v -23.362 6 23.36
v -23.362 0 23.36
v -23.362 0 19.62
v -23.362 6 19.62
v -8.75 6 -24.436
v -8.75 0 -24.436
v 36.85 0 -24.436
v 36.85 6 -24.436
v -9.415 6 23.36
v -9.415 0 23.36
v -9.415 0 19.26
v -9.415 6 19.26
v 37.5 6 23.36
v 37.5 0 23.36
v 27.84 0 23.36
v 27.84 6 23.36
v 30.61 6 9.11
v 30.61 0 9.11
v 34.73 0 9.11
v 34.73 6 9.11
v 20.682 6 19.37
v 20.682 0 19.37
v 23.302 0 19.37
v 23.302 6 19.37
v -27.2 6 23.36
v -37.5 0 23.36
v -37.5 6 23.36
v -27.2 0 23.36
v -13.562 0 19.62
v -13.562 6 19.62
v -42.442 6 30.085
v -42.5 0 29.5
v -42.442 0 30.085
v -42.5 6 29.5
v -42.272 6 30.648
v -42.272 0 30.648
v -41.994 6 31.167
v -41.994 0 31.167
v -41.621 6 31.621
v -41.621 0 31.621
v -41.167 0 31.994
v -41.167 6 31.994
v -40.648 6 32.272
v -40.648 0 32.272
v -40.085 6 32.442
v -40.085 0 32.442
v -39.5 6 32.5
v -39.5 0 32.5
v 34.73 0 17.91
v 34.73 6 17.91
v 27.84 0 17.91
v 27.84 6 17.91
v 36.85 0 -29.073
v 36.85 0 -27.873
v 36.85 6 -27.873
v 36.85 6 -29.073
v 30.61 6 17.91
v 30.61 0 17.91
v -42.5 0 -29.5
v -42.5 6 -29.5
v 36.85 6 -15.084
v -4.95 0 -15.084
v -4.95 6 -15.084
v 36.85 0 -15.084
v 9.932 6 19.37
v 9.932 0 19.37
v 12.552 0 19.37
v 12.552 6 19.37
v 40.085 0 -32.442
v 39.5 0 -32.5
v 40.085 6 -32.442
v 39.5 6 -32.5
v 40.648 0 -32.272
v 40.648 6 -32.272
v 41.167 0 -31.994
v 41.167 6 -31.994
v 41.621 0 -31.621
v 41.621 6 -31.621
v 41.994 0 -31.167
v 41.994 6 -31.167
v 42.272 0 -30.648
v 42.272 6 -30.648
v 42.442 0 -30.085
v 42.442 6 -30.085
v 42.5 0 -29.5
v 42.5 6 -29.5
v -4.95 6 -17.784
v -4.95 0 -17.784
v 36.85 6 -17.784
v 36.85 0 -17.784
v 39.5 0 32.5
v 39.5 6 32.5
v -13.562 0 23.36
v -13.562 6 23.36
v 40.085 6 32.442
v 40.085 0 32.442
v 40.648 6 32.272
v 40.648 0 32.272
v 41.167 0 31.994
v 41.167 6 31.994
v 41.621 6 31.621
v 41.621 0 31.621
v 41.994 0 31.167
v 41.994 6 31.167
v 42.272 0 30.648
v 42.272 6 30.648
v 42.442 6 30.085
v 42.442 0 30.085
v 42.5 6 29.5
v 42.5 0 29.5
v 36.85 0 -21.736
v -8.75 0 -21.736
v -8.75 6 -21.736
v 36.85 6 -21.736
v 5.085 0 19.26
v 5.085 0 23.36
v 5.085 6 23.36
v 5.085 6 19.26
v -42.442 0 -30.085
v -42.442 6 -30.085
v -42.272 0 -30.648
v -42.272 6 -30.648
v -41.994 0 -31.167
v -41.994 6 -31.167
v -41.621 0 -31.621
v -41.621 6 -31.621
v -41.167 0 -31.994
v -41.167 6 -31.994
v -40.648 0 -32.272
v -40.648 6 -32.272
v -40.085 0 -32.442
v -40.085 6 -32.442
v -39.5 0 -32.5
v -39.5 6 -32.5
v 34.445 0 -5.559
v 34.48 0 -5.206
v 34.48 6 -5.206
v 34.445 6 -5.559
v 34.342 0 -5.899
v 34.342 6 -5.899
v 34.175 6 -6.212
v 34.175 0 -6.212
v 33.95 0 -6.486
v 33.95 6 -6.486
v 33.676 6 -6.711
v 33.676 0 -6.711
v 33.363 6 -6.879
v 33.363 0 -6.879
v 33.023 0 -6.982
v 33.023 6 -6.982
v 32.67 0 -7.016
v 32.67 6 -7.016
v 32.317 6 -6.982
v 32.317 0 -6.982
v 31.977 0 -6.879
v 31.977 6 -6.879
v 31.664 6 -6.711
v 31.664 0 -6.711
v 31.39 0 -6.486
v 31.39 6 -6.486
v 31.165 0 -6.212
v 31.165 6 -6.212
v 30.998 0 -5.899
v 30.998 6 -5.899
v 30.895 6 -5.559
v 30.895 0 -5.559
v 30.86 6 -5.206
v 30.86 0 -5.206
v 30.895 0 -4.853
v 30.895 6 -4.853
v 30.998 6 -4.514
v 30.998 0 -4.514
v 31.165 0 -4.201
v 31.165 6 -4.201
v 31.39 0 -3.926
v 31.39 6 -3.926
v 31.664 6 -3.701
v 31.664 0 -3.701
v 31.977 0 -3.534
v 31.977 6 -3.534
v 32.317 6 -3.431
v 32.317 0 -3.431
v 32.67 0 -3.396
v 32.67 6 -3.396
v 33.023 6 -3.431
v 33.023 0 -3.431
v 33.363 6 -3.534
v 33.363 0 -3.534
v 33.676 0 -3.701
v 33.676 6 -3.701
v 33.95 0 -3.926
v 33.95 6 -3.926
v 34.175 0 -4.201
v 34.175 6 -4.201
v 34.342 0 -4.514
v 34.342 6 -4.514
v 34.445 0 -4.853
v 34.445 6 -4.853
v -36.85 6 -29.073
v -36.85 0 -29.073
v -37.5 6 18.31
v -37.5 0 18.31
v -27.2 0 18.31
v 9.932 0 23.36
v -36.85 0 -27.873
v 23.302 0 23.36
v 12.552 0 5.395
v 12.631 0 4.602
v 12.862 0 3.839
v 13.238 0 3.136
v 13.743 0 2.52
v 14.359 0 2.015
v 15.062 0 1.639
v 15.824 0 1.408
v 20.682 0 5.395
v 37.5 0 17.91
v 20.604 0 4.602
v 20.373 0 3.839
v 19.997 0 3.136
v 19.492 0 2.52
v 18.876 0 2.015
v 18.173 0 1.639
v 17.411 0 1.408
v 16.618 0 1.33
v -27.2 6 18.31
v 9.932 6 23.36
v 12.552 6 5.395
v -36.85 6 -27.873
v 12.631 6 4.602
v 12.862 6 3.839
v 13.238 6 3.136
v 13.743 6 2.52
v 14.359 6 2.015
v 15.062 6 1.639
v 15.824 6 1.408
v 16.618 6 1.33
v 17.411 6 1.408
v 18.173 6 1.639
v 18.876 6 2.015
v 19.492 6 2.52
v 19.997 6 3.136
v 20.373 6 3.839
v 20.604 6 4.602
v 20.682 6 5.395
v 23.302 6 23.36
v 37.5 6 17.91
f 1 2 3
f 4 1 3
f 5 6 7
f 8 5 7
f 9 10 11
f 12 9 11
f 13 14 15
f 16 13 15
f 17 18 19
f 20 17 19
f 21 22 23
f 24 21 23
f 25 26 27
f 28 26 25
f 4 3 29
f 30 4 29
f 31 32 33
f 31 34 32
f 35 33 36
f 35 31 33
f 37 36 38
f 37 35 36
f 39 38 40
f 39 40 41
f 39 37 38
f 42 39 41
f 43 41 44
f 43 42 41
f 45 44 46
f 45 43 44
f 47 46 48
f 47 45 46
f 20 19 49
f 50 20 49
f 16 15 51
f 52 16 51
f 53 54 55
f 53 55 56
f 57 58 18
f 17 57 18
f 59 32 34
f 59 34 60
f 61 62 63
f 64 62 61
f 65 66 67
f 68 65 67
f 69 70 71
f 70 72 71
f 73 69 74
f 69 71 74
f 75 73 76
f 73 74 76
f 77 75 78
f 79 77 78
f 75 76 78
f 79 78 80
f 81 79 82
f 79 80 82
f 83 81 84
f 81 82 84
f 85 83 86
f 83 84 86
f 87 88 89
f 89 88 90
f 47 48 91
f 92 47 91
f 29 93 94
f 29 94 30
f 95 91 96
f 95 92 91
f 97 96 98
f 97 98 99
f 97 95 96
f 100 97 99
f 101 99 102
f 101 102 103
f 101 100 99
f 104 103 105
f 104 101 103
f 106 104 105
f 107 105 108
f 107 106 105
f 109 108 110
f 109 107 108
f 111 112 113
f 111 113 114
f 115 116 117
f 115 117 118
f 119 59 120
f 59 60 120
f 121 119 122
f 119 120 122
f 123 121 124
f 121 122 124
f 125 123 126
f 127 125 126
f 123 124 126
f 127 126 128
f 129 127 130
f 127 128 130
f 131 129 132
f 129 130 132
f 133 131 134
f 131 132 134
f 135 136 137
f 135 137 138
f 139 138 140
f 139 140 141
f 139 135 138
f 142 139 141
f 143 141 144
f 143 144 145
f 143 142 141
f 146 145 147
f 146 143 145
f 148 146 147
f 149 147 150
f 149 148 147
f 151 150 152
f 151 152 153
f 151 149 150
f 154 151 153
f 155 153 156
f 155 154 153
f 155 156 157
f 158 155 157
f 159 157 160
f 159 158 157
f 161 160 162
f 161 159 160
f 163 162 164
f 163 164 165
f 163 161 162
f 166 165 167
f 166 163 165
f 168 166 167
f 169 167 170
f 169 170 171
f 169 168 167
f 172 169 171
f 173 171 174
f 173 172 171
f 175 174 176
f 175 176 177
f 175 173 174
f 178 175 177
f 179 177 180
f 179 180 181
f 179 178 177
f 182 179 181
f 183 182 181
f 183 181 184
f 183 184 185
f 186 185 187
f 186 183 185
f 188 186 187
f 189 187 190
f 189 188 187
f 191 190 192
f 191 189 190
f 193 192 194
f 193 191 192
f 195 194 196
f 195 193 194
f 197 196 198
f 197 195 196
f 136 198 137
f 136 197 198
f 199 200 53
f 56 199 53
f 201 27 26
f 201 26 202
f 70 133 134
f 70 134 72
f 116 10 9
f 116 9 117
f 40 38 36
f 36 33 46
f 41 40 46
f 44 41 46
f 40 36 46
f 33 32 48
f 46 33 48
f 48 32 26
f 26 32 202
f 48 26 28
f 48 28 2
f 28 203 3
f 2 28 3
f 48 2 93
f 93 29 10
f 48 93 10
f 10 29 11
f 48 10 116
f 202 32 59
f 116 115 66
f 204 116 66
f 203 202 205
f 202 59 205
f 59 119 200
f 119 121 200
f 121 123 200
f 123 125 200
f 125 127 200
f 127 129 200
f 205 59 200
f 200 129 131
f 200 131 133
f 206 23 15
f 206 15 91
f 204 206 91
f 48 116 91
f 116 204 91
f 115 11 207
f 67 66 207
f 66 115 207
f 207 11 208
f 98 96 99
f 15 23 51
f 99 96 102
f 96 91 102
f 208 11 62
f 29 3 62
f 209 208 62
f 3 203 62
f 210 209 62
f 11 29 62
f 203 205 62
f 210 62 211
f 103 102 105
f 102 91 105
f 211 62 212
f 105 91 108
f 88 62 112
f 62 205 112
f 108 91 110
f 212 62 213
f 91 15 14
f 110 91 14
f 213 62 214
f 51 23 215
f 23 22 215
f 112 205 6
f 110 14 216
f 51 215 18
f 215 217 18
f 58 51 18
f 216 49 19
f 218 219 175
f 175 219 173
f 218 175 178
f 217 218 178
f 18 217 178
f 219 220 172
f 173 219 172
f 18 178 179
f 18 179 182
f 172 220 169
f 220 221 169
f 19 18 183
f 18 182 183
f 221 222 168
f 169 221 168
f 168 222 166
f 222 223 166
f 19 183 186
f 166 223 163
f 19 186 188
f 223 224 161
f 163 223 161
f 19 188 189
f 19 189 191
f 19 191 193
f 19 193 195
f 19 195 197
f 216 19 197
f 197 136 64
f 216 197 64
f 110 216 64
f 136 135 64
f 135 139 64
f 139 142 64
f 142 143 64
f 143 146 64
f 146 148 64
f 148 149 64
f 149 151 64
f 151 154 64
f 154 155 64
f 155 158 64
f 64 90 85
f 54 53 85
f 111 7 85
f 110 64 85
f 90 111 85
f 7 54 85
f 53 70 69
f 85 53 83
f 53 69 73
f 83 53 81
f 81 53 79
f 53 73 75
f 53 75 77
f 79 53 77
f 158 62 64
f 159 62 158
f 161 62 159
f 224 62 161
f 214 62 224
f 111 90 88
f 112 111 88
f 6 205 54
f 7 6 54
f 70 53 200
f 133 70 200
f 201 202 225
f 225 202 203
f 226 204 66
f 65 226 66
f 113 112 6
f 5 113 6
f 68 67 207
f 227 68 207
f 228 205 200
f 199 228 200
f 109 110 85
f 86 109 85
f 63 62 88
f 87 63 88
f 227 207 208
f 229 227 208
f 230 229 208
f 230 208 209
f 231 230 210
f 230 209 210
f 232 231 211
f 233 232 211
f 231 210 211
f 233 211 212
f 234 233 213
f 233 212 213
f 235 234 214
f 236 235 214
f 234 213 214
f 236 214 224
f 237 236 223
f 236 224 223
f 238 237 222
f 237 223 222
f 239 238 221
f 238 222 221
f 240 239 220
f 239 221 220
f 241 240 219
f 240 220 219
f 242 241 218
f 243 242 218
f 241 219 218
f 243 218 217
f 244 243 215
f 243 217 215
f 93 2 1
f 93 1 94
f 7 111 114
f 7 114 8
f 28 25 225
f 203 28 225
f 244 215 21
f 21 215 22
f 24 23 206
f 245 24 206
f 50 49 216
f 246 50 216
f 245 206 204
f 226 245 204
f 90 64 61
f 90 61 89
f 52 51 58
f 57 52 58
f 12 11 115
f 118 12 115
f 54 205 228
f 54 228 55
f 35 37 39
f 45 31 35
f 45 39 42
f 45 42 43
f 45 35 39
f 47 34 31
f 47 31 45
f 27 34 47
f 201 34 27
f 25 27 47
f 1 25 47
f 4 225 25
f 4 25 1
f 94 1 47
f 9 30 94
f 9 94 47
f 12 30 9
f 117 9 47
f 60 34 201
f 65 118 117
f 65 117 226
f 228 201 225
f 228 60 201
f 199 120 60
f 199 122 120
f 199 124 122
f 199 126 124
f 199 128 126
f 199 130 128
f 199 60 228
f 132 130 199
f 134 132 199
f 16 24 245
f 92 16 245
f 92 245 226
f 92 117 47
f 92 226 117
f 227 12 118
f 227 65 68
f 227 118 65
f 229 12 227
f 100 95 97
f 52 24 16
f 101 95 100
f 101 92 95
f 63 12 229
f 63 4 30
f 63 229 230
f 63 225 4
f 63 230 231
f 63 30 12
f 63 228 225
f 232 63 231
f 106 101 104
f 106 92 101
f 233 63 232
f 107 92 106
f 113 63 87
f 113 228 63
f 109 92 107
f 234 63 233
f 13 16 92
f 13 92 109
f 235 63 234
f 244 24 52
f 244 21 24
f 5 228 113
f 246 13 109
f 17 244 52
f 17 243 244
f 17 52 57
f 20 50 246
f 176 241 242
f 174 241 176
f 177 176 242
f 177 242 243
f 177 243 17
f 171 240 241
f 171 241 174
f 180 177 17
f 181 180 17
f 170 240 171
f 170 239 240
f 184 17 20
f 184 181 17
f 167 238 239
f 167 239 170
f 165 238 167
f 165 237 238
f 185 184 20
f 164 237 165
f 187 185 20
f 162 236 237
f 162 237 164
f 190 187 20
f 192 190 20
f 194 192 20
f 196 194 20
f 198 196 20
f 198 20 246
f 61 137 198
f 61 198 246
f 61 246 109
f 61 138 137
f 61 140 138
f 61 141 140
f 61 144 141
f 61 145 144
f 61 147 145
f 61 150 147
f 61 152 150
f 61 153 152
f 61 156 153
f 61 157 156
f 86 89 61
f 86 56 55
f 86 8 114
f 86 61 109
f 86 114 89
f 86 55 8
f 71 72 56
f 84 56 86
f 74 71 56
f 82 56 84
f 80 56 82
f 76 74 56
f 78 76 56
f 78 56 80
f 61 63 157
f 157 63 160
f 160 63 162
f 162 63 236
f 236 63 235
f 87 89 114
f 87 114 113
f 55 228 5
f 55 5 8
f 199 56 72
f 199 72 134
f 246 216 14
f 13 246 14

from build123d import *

# Parameters (mm, degrees)
SKETCH1_W           = 85
SKETCH1_H           = 65
SKETCH1_R           = 1.81
SKETCH1_W_2         = 14.5
SKETCH1_H_2         = 4.1
SKETCH1_W_3         = 9.8
SKETCH1_H_3         = 3.74
SKETCH1_W_4         = 10.3
SKETCH1_H_4         = 5.05
SKETCH1_W_5         = 73.7
SKETCH1_H_5         = 1.2
SKETCH1_W_6         = 45.6
SKETCH1_H_6         = 2.7
SKETCH1_W_7         = 41.8
BOSS_EXTRUDE1_DEPTH = 6
FILLET1_R           = 3


with BuildPart() as part:
    # Sketch1 → Boss-Extrude1 (new body)
    with BuildSketch(Plane(origin=(0, 0, 0), x_dir=(1, 0, 0), z_dir=(0, 1, 0))):
        Rectangle(SKETCH1_W, SKETCH1_H)
        with Locations((32.67, 5.206342289)):
            Circle(SKETCH1_R, mode=Mode.SUBTRACT)
        Polygon((37.5, -23.359842136), (27.84, -23.359842136), (27.84, -17.909842136), (30.61, -17.909842136), (30.61, -9.109842136), (34.73, -9.109842136), (34.73, -17.909842136), (37.5, -17.909842136), align=None, mode=Mode.SUBTRACT)
        with BuildLine():
            Line((23.3025, -23.359842136), (9.9325, -23.359842136))
            Line((9.9325, -23.359842136), (9.9325, -19.369842136))
            Line((9.9325, -19.369842136), (12.5525, -19.369842136))
            Line((12.5525, -19.369842136), (12.5525, -5.394842136))
            ThreePointArc((12.5525, -5.394842136), (16.6175, -1.329842136), (20.6825, -5.394842136))
            Line((20.6825, -5.394842136), (20.6825, -19.369842136))
            Line((20.6825, -19.369842136), (23.3025, -19.369842136))
            Line((23.3025, -19.369842136), (23.3025, -23.359842136))
        make_face(mode=Mode.SUBTRACT)
        with Locations((-2.165, -21.309842136)):
            Rectangle(SKETCH1_W_2, SKETCH1_H_2, mode=Mode.SUBTRACT)
        with Locations((-18.4625, -21.489842136)):
            Rectangle(SKETCH1_W_3, SKETCH1_H_3, mode=Mode.SUBTRACT)
        with Locations((-32.35, -20.834842136)):
            Rectangle(SKETCH1_W_4, SKETCH1_H_4, mode=Mode.SUBTRACT)
        with Locations((0, 28.473253228)):
            Rectangle(SKETCH1_W_5, SKETCH1_H_5, mode=Mode.SUBTRACT)
        with Locations((14.05, 23.086178608)):
            Rectangle(SKETCH1_W_6, SKETCH1_H_6, mode=Mode.SUBTRACT)
        with Locations((15.95, 16.43449293)):
            Rectangle(SKETCH1_W_7, SKETCH1_H_6, mode=Mode.SUBTRACT)
    extrude(amount=BOSS_EXTRUDE1_DEPTH)

    # Fillet1
    fillet1_edges = [part.edges().sort_by_distance(p)[0] for p in [
        (42.5, 3, 32.5),
        (-42.5, 3, 32.5),
        (-42.5, 3, -32.5),
        (42.5, 3, -32.5),
    ]]
    fillet(fillet1_edges, radius=FILLET1_R)


solid = part.part
